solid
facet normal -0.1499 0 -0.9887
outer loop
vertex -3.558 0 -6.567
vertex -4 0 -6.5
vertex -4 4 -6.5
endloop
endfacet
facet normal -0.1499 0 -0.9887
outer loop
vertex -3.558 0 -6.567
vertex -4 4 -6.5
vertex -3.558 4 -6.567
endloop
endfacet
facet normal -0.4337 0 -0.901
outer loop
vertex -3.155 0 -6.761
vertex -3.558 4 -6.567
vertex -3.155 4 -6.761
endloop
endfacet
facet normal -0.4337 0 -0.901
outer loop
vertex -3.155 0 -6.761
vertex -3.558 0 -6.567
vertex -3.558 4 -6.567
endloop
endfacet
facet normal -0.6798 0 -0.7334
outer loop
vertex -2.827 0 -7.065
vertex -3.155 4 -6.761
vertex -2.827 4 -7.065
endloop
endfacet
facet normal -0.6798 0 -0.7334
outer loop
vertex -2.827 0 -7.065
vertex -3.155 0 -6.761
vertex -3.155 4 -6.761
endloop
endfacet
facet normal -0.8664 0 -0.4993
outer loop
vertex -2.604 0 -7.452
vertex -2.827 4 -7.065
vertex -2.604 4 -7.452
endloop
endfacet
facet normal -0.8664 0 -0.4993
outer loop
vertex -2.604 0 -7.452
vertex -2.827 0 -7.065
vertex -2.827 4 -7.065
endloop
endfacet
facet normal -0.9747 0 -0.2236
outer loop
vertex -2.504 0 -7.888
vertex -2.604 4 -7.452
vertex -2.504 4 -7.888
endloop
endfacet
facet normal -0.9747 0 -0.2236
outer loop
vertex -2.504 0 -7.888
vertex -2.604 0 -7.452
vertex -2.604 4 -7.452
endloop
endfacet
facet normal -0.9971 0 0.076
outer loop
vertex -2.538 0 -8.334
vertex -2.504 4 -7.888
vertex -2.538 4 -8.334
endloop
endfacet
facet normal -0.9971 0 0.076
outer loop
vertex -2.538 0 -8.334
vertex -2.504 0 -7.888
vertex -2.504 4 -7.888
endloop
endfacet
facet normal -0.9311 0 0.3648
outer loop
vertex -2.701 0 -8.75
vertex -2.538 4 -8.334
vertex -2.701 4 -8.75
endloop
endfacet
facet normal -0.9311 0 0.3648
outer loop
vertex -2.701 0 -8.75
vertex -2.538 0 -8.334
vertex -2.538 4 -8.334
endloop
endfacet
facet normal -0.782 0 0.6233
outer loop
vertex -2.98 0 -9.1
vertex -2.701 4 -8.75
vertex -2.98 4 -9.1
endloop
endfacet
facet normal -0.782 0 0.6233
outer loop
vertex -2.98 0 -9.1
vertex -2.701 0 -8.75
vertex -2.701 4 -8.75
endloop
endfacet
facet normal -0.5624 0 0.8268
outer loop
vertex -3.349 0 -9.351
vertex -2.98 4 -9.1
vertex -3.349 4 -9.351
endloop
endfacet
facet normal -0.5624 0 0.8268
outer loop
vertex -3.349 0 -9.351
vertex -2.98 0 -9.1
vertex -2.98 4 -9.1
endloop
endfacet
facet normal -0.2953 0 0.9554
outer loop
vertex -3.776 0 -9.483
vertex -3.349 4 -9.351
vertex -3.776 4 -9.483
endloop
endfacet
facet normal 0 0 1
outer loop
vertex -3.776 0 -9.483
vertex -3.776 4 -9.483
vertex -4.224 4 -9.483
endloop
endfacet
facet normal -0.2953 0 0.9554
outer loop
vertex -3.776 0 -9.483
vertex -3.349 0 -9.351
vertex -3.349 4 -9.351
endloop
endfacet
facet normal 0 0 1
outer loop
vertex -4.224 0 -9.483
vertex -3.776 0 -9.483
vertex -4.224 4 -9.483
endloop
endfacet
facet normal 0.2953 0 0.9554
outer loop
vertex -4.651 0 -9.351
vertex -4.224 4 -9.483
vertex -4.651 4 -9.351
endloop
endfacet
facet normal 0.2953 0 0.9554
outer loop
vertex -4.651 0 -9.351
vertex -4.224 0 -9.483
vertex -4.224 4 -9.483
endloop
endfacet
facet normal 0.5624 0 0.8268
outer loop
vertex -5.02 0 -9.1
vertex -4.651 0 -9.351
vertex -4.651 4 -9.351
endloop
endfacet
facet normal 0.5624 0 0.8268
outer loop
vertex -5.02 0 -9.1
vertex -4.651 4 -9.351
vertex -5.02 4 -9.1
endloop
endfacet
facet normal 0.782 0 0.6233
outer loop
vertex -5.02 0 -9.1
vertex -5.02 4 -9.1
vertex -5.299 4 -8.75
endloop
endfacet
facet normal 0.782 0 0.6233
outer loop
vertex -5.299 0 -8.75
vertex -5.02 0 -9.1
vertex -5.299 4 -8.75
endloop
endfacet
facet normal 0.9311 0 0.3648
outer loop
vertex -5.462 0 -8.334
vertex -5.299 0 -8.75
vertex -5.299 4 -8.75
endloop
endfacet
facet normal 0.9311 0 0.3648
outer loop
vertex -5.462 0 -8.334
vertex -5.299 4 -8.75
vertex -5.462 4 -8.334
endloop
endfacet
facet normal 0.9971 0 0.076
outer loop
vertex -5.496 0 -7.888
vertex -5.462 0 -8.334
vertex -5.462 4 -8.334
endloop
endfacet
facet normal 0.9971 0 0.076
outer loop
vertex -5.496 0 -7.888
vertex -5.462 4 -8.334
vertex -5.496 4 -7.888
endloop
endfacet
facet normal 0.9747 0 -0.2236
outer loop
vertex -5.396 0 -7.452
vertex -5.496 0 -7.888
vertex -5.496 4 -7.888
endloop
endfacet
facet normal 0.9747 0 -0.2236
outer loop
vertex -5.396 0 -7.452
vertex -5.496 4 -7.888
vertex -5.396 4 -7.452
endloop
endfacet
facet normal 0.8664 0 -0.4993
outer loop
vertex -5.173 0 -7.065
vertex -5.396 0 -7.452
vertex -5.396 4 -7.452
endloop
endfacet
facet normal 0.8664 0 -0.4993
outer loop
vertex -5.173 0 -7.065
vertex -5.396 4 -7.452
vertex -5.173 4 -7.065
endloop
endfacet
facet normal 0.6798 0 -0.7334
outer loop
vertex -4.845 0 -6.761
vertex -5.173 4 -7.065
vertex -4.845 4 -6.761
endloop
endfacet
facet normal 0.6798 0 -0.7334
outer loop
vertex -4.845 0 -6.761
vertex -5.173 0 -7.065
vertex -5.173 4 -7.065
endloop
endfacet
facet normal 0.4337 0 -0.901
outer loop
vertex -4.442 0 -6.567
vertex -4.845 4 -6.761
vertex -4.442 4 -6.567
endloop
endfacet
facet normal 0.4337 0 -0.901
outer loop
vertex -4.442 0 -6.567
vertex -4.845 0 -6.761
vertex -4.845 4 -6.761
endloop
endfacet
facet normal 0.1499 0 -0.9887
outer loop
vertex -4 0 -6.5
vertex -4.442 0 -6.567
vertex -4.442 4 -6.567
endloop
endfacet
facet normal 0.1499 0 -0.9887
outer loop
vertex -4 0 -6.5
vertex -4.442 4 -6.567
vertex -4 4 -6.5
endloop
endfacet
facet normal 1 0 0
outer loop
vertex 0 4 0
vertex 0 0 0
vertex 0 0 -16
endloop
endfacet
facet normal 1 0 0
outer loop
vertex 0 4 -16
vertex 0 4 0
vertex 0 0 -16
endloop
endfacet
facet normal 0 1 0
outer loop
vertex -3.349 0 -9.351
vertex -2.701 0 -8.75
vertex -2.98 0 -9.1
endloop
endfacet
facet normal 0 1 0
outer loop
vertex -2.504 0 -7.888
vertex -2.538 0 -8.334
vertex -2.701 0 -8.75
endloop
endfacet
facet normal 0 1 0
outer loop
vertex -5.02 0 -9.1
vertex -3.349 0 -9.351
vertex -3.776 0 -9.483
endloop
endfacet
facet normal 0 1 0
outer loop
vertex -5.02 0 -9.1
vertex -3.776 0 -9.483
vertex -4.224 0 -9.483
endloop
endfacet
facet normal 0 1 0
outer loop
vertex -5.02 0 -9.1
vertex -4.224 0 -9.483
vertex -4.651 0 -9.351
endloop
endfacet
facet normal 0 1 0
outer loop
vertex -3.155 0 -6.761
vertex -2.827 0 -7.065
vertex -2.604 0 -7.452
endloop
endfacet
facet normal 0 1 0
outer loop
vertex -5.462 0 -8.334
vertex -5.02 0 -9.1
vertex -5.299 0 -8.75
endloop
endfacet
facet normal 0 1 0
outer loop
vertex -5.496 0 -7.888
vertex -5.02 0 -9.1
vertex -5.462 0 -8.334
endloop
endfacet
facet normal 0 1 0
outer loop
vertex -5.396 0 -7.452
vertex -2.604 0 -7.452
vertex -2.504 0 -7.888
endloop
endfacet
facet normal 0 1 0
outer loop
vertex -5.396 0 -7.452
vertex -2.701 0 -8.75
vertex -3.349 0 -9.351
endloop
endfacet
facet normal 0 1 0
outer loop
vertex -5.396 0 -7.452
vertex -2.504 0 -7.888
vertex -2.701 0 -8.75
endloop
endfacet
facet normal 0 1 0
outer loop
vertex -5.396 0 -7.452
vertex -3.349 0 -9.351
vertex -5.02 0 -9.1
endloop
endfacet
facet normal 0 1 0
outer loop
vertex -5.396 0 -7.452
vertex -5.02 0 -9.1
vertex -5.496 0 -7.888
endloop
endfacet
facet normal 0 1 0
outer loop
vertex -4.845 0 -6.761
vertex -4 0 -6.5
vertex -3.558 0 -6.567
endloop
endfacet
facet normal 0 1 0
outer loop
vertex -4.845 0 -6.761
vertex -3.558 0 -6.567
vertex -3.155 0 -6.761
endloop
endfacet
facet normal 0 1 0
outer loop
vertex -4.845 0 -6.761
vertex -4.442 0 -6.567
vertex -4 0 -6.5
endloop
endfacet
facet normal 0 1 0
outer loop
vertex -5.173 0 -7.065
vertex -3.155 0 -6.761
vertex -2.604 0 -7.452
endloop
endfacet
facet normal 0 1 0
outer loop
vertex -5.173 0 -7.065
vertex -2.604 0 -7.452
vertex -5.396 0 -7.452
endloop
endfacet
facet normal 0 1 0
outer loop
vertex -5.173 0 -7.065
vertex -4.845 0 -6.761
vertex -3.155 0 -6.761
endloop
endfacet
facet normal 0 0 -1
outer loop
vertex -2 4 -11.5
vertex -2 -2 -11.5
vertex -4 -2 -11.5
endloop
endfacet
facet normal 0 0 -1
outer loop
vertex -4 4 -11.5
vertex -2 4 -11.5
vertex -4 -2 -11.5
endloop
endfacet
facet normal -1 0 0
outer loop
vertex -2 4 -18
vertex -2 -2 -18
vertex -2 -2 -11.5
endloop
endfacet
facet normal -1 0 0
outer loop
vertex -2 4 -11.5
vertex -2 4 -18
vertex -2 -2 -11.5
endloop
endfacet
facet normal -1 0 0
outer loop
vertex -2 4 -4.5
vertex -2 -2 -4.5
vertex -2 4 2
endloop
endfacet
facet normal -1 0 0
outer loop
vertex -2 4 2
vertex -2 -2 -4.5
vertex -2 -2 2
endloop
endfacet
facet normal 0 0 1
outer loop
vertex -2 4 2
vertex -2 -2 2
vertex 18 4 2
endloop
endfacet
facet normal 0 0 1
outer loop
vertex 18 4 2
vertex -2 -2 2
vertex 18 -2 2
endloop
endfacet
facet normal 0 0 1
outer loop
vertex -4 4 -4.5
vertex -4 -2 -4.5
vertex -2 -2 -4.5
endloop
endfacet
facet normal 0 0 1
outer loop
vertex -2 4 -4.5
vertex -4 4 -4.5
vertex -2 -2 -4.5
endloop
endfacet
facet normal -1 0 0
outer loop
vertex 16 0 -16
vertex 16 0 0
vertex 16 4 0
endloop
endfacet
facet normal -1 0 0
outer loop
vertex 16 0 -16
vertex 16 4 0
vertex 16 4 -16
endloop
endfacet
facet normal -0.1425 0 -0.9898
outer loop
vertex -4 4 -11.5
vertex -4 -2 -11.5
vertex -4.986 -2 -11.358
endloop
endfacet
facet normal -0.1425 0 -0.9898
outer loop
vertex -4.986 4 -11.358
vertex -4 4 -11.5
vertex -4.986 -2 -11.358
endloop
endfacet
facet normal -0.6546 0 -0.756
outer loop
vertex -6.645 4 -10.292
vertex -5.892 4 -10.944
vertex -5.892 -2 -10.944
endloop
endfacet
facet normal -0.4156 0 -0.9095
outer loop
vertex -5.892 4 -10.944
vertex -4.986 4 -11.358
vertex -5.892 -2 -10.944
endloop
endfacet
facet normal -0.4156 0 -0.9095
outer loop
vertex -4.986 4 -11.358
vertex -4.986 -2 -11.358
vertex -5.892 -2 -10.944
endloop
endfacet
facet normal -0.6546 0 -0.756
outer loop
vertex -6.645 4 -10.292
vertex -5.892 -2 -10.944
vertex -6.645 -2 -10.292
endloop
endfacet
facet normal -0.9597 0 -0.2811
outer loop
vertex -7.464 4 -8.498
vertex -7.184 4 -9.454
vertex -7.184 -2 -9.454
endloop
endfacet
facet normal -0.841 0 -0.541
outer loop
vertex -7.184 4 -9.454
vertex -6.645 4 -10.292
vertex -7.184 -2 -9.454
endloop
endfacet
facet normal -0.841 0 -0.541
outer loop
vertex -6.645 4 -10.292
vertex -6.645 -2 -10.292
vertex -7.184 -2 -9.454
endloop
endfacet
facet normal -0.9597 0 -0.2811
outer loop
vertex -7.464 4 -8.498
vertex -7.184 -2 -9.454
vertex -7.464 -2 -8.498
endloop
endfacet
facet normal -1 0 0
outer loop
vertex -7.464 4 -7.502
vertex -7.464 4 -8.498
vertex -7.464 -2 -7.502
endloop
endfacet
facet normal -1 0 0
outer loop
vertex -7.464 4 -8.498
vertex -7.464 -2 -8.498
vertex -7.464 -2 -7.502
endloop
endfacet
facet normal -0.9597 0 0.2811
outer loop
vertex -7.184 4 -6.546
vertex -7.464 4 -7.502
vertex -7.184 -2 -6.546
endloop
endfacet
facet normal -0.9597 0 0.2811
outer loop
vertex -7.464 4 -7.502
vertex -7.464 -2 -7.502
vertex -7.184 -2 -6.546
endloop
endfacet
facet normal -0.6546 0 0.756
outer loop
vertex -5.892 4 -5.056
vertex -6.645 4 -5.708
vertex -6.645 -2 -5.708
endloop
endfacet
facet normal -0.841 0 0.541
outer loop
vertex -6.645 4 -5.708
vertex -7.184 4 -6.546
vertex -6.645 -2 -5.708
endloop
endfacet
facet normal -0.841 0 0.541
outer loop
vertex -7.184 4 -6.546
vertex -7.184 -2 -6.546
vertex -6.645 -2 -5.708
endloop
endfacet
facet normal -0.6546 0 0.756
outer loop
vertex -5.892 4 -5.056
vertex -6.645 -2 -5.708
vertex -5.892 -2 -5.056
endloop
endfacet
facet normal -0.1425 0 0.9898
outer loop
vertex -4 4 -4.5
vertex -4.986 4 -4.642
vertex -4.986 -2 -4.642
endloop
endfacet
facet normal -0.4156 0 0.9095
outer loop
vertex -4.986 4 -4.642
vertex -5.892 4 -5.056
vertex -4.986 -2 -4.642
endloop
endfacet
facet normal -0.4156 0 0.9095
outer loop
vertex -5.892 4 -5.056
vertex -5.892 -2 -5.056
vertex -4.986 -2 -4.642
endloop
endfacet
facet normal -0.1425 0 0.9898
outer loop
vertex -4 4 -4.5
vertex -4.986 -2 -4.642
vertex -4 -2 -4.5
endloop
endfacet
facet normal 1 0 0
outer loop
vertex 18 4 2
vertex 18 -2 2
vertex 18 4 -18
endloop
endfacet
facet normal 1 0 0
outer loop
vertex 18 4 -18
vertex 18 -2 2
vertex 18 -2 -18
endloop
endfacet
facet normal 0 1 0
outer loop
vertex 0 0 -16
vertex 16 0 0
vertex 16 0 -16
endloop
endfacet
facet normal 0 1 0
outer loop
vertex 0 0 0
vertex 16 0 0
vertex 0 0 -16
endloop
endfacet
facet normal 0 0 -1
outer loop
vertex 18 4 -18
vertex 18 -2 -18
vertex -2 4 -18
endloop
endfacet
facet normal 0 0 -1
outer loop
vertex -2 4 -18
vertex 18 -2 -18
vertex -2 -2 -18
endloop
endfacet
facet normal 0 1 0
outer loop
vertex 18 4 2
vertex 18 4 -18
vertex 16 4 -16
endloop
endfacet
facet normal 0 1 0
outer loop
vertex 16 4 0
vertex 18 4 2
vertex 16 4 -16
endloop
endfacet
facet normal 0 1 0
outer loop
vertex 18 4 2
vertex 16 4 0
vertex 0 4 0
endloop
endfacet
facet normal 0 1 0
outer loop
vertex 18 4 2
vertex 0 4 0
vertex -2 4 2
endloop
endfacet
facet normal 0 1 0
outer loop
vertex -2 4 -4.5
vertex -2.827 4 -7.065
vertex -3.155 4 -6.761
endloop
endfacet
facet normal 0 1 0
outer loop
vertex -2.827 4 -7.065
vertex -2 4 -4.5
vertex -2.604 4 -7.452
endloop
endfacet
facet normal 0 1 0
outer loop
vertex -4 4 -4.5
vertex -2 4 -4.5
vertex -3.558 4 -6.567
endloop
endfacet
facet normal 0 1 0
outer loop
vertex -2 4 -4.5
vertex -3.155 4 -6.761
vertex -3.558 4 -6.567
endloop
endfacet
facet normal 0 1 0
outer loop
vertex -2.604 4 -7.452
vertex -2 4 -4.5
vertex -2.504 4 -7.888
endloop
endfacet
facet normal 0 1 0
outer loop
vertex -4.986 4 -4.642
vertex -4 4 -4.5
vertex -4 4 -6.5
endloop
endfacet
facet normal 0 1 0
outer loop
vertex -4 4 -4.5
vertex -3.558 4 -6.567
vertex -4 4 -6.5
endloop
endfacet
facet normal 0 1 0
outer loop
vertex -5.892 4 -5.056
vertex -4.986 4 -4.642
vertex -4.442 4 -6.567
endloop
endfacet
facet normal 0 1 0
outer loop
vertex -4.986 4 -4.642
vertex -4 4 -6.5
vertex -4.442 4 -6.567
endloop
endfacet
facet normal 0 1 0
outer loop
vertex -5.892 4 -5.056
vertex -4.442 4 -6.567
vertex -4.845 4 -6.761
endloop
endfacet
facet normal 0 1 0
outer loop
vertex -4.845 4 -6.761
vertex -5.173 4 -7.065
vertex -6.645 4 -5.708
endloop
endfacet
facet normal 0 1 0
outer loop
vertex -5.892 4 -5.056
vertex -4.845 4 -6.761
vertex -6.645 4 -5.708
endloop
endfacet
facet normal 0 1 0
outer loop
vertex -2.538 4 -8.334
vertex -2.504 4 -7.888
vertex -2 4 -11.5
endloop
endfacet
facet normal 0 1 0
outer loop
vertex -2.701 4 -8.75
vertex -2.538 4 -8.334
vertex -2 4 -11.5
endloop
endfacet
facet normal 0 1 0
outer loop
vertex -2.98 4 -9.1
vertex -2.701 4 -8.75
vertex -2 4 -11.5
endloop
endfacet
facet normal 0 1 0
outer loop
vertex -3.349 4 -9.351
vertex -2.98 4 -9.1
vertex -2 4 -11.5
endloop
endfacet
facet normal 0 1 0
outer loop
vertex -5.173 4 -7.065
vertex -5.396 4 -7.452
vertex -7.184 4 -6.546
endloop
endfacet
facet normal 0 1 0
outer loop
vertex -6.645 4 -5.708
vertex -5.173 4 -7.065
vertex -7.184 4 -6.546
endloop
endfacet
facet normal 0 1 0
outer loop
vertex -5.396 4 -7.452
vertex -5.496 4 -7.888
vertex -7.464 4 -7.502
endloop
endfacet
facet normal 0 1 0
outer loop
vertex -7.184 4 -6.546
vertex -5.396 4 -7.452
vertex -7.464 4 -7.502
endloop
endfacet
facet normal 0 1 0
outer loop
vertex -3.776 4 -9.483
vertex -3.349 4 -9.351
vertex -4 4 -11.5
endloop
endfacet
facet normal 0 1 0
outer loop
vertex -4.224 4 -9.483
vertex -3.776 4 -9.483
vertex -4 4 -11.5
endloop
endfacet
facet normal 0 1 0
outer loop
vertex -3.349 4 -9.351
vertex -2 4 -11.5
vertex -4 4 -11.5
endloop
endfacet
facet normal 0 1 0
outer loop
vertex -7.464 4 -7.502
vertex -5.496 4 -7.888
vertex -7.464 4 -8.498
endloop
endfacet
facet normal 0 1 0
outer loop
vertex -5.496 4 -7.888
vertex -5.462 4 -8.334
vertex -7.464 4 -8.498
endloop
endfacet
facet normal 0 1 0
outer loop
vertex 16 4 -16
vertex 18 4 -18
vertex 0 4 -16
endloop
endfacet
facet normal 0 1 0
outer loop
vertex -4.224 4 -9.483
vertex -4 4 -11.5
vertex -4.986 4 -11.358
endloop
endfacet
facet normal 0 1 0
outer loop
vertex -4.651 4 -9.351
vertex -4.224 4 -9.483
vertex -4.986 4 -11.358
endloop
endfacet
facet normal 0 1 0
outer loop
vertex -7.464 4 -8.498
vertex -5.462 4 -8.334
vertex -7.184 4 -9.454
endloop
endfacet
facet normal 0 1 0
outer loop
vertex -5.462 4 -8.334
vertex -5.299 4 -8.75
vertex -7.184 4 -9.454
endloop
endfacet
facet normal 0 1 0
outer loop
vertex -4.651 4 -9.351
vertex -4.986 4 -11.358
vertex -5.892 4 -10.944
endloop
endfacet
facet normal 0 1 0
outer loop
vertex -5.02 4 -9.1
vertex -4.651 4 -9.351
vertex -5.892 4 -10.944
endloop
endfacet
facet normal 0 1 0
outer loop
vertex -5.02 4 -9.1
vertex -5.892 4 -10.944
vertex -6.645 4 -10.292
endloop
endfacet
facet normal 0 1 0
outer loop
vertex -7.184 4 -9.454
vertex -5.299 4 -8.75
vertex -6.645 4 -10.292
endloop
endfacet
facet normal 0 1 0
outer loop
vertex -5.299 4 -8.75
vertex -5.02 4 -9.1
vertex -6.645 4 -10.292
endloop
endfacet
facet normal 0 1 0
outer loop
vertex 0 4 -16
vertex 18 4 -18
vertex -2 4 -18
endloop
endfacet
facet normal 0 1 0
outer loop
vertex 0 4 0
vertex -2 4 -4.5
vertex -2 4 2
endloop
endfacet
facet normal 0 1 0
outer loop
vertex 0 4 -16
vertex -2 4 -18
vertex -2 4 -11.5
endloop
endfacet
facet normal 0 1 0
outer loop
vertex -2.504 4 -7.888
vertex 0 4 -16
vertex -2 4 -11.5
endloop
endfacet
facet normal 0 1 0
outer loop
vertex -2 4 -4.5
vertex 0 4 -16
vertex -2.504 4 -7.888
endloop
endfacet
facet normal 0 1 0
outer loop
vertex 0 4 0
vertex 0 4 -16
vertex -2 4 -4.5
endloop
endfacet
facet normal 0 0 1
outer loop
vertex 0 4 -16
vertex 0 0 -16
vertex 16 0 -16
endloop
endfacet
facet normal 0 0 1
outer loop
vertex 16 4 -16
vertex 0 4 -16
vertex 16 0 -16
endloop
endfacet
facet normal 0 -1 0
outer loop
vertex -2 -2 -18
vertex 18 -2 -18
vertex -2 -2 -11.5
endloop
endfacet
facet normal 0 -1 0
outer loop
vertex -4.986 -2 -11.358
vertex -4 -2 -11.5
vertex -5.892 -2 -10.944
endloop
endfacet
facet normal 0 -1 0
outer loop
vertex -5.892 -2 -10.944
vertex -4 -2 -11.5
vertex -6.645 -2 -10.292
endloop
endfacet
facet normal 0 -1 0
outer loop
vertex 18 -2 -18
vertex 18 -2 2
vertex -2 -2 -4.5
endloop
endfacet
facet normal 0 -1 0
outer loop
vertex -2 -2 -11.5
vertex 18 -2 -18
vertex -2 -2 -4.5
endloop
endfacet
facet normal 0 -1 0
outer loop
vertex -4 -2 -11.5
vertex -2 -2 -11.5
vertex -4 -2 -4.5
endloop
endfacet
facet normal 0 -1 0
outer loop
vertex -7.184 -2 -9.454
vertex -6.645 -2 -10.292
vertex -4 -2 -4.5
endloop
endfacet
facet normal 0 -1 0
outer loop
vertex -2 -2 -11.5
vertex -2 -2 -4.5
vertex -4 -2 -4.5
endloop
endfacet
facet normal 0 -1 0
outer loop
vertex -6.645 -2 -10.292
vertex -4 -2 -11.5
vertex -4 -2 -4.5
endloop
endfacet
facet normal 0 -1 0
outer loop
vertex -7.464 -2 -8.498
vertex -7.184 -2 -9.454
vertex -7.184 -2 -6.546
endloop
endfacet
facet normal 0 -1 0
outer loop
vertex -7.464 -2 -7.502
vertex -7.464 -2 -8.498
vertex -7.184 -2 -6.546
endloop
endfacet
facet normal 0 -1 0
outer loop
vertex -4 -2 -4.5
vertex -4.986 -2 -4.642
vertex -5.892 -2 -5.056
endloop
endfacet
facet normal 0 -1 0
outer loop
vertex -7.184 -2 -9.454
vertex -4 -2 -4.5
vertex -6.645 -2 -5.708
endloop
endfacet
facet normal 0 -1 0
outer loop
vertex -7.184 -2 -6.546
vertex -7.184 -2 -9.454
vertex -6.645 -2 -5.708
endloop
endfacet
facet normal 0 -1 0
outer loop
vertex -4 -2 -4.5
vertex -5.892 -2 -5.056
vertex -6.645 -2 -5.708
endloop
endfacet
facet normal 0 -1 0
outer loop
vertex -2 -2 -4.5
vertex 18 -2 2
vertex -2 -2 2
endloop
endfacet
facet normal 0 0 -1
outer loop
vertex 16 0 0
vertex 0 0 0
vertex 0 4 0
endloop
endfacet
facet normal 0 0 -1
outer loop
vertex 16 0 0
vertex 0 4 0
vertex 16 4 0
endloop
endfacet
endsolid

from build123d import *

# Parameters (mm, degrees)
SKETCH1_R           = 1.5
SKETCH1_W           = 16
SKETCH1_H           = 16
BOSS_EXTRUDE1_DEPTH = 4
BOSS_EXTRUDE2_START = 2
BOSS_EXTRUDE2_DEPTH = 2


with BuildPart() as part:
    # Sketch1 → Boss-Extrude1 (new body)
    with BuildSketch(Plane(origin=(0, 0, 0), x_dir=(1, 0, 0), z_dir=(0, 1, 0))):
        with BuildLine():
            Line((-2, 18), (18, 18))
            Line((18, 18), (18, -2))
            Line((18, -2), (-2, -2))
            Line((-2, -2), (-2, 4.5))
            Line((-2, 4.5), (-4, 4.5))
            ThreePointArc((-4, 4.5), (-7.5, 8), (-4, 11.5))
            Line((-4, 11.5), (-2, 11.5))
            Line((-2, 11.5), (-2, 18))
        make_face()
        with Locations(Location((-4, 8, 0), (0, 0, 270))):
            Circle(SKETCH1_R, mode=Mode.SUBTRACT)
        with Locations((8, 8)):
            Rectangle(SKETCH1_W, SKETCH1_H, mode=Mode.SUBTRACT)
    extrude(amount=BOSS_EXTRUDE1_DEPTH)

    # Sketch2 → Boss-Extrude2 (add)
    with BuildSketch(Plane.XZ.offset(BOSS_EXTRUDE2_START)):
        with BuildLine():
            Line((18, 2), (18, -18))
            Line((18, -18), (-2, -18))
            Line((-2, -18), (-2, -11.5))
            Line((-2, -11.5), (-4, -11.5))
            ThreePointArc((-4, -11.5), (-7.5, -8), (-4, -4.5))
            Line((-4, -4.5), (-2, -4.5))
            Line((-2, -4.5), (-2, 2))
            Line((-2, 2), (18, 2))
        make_face()
    extrude(amount=-BOSS_EXTRUDE2_DEPTH)


solid = part.part
